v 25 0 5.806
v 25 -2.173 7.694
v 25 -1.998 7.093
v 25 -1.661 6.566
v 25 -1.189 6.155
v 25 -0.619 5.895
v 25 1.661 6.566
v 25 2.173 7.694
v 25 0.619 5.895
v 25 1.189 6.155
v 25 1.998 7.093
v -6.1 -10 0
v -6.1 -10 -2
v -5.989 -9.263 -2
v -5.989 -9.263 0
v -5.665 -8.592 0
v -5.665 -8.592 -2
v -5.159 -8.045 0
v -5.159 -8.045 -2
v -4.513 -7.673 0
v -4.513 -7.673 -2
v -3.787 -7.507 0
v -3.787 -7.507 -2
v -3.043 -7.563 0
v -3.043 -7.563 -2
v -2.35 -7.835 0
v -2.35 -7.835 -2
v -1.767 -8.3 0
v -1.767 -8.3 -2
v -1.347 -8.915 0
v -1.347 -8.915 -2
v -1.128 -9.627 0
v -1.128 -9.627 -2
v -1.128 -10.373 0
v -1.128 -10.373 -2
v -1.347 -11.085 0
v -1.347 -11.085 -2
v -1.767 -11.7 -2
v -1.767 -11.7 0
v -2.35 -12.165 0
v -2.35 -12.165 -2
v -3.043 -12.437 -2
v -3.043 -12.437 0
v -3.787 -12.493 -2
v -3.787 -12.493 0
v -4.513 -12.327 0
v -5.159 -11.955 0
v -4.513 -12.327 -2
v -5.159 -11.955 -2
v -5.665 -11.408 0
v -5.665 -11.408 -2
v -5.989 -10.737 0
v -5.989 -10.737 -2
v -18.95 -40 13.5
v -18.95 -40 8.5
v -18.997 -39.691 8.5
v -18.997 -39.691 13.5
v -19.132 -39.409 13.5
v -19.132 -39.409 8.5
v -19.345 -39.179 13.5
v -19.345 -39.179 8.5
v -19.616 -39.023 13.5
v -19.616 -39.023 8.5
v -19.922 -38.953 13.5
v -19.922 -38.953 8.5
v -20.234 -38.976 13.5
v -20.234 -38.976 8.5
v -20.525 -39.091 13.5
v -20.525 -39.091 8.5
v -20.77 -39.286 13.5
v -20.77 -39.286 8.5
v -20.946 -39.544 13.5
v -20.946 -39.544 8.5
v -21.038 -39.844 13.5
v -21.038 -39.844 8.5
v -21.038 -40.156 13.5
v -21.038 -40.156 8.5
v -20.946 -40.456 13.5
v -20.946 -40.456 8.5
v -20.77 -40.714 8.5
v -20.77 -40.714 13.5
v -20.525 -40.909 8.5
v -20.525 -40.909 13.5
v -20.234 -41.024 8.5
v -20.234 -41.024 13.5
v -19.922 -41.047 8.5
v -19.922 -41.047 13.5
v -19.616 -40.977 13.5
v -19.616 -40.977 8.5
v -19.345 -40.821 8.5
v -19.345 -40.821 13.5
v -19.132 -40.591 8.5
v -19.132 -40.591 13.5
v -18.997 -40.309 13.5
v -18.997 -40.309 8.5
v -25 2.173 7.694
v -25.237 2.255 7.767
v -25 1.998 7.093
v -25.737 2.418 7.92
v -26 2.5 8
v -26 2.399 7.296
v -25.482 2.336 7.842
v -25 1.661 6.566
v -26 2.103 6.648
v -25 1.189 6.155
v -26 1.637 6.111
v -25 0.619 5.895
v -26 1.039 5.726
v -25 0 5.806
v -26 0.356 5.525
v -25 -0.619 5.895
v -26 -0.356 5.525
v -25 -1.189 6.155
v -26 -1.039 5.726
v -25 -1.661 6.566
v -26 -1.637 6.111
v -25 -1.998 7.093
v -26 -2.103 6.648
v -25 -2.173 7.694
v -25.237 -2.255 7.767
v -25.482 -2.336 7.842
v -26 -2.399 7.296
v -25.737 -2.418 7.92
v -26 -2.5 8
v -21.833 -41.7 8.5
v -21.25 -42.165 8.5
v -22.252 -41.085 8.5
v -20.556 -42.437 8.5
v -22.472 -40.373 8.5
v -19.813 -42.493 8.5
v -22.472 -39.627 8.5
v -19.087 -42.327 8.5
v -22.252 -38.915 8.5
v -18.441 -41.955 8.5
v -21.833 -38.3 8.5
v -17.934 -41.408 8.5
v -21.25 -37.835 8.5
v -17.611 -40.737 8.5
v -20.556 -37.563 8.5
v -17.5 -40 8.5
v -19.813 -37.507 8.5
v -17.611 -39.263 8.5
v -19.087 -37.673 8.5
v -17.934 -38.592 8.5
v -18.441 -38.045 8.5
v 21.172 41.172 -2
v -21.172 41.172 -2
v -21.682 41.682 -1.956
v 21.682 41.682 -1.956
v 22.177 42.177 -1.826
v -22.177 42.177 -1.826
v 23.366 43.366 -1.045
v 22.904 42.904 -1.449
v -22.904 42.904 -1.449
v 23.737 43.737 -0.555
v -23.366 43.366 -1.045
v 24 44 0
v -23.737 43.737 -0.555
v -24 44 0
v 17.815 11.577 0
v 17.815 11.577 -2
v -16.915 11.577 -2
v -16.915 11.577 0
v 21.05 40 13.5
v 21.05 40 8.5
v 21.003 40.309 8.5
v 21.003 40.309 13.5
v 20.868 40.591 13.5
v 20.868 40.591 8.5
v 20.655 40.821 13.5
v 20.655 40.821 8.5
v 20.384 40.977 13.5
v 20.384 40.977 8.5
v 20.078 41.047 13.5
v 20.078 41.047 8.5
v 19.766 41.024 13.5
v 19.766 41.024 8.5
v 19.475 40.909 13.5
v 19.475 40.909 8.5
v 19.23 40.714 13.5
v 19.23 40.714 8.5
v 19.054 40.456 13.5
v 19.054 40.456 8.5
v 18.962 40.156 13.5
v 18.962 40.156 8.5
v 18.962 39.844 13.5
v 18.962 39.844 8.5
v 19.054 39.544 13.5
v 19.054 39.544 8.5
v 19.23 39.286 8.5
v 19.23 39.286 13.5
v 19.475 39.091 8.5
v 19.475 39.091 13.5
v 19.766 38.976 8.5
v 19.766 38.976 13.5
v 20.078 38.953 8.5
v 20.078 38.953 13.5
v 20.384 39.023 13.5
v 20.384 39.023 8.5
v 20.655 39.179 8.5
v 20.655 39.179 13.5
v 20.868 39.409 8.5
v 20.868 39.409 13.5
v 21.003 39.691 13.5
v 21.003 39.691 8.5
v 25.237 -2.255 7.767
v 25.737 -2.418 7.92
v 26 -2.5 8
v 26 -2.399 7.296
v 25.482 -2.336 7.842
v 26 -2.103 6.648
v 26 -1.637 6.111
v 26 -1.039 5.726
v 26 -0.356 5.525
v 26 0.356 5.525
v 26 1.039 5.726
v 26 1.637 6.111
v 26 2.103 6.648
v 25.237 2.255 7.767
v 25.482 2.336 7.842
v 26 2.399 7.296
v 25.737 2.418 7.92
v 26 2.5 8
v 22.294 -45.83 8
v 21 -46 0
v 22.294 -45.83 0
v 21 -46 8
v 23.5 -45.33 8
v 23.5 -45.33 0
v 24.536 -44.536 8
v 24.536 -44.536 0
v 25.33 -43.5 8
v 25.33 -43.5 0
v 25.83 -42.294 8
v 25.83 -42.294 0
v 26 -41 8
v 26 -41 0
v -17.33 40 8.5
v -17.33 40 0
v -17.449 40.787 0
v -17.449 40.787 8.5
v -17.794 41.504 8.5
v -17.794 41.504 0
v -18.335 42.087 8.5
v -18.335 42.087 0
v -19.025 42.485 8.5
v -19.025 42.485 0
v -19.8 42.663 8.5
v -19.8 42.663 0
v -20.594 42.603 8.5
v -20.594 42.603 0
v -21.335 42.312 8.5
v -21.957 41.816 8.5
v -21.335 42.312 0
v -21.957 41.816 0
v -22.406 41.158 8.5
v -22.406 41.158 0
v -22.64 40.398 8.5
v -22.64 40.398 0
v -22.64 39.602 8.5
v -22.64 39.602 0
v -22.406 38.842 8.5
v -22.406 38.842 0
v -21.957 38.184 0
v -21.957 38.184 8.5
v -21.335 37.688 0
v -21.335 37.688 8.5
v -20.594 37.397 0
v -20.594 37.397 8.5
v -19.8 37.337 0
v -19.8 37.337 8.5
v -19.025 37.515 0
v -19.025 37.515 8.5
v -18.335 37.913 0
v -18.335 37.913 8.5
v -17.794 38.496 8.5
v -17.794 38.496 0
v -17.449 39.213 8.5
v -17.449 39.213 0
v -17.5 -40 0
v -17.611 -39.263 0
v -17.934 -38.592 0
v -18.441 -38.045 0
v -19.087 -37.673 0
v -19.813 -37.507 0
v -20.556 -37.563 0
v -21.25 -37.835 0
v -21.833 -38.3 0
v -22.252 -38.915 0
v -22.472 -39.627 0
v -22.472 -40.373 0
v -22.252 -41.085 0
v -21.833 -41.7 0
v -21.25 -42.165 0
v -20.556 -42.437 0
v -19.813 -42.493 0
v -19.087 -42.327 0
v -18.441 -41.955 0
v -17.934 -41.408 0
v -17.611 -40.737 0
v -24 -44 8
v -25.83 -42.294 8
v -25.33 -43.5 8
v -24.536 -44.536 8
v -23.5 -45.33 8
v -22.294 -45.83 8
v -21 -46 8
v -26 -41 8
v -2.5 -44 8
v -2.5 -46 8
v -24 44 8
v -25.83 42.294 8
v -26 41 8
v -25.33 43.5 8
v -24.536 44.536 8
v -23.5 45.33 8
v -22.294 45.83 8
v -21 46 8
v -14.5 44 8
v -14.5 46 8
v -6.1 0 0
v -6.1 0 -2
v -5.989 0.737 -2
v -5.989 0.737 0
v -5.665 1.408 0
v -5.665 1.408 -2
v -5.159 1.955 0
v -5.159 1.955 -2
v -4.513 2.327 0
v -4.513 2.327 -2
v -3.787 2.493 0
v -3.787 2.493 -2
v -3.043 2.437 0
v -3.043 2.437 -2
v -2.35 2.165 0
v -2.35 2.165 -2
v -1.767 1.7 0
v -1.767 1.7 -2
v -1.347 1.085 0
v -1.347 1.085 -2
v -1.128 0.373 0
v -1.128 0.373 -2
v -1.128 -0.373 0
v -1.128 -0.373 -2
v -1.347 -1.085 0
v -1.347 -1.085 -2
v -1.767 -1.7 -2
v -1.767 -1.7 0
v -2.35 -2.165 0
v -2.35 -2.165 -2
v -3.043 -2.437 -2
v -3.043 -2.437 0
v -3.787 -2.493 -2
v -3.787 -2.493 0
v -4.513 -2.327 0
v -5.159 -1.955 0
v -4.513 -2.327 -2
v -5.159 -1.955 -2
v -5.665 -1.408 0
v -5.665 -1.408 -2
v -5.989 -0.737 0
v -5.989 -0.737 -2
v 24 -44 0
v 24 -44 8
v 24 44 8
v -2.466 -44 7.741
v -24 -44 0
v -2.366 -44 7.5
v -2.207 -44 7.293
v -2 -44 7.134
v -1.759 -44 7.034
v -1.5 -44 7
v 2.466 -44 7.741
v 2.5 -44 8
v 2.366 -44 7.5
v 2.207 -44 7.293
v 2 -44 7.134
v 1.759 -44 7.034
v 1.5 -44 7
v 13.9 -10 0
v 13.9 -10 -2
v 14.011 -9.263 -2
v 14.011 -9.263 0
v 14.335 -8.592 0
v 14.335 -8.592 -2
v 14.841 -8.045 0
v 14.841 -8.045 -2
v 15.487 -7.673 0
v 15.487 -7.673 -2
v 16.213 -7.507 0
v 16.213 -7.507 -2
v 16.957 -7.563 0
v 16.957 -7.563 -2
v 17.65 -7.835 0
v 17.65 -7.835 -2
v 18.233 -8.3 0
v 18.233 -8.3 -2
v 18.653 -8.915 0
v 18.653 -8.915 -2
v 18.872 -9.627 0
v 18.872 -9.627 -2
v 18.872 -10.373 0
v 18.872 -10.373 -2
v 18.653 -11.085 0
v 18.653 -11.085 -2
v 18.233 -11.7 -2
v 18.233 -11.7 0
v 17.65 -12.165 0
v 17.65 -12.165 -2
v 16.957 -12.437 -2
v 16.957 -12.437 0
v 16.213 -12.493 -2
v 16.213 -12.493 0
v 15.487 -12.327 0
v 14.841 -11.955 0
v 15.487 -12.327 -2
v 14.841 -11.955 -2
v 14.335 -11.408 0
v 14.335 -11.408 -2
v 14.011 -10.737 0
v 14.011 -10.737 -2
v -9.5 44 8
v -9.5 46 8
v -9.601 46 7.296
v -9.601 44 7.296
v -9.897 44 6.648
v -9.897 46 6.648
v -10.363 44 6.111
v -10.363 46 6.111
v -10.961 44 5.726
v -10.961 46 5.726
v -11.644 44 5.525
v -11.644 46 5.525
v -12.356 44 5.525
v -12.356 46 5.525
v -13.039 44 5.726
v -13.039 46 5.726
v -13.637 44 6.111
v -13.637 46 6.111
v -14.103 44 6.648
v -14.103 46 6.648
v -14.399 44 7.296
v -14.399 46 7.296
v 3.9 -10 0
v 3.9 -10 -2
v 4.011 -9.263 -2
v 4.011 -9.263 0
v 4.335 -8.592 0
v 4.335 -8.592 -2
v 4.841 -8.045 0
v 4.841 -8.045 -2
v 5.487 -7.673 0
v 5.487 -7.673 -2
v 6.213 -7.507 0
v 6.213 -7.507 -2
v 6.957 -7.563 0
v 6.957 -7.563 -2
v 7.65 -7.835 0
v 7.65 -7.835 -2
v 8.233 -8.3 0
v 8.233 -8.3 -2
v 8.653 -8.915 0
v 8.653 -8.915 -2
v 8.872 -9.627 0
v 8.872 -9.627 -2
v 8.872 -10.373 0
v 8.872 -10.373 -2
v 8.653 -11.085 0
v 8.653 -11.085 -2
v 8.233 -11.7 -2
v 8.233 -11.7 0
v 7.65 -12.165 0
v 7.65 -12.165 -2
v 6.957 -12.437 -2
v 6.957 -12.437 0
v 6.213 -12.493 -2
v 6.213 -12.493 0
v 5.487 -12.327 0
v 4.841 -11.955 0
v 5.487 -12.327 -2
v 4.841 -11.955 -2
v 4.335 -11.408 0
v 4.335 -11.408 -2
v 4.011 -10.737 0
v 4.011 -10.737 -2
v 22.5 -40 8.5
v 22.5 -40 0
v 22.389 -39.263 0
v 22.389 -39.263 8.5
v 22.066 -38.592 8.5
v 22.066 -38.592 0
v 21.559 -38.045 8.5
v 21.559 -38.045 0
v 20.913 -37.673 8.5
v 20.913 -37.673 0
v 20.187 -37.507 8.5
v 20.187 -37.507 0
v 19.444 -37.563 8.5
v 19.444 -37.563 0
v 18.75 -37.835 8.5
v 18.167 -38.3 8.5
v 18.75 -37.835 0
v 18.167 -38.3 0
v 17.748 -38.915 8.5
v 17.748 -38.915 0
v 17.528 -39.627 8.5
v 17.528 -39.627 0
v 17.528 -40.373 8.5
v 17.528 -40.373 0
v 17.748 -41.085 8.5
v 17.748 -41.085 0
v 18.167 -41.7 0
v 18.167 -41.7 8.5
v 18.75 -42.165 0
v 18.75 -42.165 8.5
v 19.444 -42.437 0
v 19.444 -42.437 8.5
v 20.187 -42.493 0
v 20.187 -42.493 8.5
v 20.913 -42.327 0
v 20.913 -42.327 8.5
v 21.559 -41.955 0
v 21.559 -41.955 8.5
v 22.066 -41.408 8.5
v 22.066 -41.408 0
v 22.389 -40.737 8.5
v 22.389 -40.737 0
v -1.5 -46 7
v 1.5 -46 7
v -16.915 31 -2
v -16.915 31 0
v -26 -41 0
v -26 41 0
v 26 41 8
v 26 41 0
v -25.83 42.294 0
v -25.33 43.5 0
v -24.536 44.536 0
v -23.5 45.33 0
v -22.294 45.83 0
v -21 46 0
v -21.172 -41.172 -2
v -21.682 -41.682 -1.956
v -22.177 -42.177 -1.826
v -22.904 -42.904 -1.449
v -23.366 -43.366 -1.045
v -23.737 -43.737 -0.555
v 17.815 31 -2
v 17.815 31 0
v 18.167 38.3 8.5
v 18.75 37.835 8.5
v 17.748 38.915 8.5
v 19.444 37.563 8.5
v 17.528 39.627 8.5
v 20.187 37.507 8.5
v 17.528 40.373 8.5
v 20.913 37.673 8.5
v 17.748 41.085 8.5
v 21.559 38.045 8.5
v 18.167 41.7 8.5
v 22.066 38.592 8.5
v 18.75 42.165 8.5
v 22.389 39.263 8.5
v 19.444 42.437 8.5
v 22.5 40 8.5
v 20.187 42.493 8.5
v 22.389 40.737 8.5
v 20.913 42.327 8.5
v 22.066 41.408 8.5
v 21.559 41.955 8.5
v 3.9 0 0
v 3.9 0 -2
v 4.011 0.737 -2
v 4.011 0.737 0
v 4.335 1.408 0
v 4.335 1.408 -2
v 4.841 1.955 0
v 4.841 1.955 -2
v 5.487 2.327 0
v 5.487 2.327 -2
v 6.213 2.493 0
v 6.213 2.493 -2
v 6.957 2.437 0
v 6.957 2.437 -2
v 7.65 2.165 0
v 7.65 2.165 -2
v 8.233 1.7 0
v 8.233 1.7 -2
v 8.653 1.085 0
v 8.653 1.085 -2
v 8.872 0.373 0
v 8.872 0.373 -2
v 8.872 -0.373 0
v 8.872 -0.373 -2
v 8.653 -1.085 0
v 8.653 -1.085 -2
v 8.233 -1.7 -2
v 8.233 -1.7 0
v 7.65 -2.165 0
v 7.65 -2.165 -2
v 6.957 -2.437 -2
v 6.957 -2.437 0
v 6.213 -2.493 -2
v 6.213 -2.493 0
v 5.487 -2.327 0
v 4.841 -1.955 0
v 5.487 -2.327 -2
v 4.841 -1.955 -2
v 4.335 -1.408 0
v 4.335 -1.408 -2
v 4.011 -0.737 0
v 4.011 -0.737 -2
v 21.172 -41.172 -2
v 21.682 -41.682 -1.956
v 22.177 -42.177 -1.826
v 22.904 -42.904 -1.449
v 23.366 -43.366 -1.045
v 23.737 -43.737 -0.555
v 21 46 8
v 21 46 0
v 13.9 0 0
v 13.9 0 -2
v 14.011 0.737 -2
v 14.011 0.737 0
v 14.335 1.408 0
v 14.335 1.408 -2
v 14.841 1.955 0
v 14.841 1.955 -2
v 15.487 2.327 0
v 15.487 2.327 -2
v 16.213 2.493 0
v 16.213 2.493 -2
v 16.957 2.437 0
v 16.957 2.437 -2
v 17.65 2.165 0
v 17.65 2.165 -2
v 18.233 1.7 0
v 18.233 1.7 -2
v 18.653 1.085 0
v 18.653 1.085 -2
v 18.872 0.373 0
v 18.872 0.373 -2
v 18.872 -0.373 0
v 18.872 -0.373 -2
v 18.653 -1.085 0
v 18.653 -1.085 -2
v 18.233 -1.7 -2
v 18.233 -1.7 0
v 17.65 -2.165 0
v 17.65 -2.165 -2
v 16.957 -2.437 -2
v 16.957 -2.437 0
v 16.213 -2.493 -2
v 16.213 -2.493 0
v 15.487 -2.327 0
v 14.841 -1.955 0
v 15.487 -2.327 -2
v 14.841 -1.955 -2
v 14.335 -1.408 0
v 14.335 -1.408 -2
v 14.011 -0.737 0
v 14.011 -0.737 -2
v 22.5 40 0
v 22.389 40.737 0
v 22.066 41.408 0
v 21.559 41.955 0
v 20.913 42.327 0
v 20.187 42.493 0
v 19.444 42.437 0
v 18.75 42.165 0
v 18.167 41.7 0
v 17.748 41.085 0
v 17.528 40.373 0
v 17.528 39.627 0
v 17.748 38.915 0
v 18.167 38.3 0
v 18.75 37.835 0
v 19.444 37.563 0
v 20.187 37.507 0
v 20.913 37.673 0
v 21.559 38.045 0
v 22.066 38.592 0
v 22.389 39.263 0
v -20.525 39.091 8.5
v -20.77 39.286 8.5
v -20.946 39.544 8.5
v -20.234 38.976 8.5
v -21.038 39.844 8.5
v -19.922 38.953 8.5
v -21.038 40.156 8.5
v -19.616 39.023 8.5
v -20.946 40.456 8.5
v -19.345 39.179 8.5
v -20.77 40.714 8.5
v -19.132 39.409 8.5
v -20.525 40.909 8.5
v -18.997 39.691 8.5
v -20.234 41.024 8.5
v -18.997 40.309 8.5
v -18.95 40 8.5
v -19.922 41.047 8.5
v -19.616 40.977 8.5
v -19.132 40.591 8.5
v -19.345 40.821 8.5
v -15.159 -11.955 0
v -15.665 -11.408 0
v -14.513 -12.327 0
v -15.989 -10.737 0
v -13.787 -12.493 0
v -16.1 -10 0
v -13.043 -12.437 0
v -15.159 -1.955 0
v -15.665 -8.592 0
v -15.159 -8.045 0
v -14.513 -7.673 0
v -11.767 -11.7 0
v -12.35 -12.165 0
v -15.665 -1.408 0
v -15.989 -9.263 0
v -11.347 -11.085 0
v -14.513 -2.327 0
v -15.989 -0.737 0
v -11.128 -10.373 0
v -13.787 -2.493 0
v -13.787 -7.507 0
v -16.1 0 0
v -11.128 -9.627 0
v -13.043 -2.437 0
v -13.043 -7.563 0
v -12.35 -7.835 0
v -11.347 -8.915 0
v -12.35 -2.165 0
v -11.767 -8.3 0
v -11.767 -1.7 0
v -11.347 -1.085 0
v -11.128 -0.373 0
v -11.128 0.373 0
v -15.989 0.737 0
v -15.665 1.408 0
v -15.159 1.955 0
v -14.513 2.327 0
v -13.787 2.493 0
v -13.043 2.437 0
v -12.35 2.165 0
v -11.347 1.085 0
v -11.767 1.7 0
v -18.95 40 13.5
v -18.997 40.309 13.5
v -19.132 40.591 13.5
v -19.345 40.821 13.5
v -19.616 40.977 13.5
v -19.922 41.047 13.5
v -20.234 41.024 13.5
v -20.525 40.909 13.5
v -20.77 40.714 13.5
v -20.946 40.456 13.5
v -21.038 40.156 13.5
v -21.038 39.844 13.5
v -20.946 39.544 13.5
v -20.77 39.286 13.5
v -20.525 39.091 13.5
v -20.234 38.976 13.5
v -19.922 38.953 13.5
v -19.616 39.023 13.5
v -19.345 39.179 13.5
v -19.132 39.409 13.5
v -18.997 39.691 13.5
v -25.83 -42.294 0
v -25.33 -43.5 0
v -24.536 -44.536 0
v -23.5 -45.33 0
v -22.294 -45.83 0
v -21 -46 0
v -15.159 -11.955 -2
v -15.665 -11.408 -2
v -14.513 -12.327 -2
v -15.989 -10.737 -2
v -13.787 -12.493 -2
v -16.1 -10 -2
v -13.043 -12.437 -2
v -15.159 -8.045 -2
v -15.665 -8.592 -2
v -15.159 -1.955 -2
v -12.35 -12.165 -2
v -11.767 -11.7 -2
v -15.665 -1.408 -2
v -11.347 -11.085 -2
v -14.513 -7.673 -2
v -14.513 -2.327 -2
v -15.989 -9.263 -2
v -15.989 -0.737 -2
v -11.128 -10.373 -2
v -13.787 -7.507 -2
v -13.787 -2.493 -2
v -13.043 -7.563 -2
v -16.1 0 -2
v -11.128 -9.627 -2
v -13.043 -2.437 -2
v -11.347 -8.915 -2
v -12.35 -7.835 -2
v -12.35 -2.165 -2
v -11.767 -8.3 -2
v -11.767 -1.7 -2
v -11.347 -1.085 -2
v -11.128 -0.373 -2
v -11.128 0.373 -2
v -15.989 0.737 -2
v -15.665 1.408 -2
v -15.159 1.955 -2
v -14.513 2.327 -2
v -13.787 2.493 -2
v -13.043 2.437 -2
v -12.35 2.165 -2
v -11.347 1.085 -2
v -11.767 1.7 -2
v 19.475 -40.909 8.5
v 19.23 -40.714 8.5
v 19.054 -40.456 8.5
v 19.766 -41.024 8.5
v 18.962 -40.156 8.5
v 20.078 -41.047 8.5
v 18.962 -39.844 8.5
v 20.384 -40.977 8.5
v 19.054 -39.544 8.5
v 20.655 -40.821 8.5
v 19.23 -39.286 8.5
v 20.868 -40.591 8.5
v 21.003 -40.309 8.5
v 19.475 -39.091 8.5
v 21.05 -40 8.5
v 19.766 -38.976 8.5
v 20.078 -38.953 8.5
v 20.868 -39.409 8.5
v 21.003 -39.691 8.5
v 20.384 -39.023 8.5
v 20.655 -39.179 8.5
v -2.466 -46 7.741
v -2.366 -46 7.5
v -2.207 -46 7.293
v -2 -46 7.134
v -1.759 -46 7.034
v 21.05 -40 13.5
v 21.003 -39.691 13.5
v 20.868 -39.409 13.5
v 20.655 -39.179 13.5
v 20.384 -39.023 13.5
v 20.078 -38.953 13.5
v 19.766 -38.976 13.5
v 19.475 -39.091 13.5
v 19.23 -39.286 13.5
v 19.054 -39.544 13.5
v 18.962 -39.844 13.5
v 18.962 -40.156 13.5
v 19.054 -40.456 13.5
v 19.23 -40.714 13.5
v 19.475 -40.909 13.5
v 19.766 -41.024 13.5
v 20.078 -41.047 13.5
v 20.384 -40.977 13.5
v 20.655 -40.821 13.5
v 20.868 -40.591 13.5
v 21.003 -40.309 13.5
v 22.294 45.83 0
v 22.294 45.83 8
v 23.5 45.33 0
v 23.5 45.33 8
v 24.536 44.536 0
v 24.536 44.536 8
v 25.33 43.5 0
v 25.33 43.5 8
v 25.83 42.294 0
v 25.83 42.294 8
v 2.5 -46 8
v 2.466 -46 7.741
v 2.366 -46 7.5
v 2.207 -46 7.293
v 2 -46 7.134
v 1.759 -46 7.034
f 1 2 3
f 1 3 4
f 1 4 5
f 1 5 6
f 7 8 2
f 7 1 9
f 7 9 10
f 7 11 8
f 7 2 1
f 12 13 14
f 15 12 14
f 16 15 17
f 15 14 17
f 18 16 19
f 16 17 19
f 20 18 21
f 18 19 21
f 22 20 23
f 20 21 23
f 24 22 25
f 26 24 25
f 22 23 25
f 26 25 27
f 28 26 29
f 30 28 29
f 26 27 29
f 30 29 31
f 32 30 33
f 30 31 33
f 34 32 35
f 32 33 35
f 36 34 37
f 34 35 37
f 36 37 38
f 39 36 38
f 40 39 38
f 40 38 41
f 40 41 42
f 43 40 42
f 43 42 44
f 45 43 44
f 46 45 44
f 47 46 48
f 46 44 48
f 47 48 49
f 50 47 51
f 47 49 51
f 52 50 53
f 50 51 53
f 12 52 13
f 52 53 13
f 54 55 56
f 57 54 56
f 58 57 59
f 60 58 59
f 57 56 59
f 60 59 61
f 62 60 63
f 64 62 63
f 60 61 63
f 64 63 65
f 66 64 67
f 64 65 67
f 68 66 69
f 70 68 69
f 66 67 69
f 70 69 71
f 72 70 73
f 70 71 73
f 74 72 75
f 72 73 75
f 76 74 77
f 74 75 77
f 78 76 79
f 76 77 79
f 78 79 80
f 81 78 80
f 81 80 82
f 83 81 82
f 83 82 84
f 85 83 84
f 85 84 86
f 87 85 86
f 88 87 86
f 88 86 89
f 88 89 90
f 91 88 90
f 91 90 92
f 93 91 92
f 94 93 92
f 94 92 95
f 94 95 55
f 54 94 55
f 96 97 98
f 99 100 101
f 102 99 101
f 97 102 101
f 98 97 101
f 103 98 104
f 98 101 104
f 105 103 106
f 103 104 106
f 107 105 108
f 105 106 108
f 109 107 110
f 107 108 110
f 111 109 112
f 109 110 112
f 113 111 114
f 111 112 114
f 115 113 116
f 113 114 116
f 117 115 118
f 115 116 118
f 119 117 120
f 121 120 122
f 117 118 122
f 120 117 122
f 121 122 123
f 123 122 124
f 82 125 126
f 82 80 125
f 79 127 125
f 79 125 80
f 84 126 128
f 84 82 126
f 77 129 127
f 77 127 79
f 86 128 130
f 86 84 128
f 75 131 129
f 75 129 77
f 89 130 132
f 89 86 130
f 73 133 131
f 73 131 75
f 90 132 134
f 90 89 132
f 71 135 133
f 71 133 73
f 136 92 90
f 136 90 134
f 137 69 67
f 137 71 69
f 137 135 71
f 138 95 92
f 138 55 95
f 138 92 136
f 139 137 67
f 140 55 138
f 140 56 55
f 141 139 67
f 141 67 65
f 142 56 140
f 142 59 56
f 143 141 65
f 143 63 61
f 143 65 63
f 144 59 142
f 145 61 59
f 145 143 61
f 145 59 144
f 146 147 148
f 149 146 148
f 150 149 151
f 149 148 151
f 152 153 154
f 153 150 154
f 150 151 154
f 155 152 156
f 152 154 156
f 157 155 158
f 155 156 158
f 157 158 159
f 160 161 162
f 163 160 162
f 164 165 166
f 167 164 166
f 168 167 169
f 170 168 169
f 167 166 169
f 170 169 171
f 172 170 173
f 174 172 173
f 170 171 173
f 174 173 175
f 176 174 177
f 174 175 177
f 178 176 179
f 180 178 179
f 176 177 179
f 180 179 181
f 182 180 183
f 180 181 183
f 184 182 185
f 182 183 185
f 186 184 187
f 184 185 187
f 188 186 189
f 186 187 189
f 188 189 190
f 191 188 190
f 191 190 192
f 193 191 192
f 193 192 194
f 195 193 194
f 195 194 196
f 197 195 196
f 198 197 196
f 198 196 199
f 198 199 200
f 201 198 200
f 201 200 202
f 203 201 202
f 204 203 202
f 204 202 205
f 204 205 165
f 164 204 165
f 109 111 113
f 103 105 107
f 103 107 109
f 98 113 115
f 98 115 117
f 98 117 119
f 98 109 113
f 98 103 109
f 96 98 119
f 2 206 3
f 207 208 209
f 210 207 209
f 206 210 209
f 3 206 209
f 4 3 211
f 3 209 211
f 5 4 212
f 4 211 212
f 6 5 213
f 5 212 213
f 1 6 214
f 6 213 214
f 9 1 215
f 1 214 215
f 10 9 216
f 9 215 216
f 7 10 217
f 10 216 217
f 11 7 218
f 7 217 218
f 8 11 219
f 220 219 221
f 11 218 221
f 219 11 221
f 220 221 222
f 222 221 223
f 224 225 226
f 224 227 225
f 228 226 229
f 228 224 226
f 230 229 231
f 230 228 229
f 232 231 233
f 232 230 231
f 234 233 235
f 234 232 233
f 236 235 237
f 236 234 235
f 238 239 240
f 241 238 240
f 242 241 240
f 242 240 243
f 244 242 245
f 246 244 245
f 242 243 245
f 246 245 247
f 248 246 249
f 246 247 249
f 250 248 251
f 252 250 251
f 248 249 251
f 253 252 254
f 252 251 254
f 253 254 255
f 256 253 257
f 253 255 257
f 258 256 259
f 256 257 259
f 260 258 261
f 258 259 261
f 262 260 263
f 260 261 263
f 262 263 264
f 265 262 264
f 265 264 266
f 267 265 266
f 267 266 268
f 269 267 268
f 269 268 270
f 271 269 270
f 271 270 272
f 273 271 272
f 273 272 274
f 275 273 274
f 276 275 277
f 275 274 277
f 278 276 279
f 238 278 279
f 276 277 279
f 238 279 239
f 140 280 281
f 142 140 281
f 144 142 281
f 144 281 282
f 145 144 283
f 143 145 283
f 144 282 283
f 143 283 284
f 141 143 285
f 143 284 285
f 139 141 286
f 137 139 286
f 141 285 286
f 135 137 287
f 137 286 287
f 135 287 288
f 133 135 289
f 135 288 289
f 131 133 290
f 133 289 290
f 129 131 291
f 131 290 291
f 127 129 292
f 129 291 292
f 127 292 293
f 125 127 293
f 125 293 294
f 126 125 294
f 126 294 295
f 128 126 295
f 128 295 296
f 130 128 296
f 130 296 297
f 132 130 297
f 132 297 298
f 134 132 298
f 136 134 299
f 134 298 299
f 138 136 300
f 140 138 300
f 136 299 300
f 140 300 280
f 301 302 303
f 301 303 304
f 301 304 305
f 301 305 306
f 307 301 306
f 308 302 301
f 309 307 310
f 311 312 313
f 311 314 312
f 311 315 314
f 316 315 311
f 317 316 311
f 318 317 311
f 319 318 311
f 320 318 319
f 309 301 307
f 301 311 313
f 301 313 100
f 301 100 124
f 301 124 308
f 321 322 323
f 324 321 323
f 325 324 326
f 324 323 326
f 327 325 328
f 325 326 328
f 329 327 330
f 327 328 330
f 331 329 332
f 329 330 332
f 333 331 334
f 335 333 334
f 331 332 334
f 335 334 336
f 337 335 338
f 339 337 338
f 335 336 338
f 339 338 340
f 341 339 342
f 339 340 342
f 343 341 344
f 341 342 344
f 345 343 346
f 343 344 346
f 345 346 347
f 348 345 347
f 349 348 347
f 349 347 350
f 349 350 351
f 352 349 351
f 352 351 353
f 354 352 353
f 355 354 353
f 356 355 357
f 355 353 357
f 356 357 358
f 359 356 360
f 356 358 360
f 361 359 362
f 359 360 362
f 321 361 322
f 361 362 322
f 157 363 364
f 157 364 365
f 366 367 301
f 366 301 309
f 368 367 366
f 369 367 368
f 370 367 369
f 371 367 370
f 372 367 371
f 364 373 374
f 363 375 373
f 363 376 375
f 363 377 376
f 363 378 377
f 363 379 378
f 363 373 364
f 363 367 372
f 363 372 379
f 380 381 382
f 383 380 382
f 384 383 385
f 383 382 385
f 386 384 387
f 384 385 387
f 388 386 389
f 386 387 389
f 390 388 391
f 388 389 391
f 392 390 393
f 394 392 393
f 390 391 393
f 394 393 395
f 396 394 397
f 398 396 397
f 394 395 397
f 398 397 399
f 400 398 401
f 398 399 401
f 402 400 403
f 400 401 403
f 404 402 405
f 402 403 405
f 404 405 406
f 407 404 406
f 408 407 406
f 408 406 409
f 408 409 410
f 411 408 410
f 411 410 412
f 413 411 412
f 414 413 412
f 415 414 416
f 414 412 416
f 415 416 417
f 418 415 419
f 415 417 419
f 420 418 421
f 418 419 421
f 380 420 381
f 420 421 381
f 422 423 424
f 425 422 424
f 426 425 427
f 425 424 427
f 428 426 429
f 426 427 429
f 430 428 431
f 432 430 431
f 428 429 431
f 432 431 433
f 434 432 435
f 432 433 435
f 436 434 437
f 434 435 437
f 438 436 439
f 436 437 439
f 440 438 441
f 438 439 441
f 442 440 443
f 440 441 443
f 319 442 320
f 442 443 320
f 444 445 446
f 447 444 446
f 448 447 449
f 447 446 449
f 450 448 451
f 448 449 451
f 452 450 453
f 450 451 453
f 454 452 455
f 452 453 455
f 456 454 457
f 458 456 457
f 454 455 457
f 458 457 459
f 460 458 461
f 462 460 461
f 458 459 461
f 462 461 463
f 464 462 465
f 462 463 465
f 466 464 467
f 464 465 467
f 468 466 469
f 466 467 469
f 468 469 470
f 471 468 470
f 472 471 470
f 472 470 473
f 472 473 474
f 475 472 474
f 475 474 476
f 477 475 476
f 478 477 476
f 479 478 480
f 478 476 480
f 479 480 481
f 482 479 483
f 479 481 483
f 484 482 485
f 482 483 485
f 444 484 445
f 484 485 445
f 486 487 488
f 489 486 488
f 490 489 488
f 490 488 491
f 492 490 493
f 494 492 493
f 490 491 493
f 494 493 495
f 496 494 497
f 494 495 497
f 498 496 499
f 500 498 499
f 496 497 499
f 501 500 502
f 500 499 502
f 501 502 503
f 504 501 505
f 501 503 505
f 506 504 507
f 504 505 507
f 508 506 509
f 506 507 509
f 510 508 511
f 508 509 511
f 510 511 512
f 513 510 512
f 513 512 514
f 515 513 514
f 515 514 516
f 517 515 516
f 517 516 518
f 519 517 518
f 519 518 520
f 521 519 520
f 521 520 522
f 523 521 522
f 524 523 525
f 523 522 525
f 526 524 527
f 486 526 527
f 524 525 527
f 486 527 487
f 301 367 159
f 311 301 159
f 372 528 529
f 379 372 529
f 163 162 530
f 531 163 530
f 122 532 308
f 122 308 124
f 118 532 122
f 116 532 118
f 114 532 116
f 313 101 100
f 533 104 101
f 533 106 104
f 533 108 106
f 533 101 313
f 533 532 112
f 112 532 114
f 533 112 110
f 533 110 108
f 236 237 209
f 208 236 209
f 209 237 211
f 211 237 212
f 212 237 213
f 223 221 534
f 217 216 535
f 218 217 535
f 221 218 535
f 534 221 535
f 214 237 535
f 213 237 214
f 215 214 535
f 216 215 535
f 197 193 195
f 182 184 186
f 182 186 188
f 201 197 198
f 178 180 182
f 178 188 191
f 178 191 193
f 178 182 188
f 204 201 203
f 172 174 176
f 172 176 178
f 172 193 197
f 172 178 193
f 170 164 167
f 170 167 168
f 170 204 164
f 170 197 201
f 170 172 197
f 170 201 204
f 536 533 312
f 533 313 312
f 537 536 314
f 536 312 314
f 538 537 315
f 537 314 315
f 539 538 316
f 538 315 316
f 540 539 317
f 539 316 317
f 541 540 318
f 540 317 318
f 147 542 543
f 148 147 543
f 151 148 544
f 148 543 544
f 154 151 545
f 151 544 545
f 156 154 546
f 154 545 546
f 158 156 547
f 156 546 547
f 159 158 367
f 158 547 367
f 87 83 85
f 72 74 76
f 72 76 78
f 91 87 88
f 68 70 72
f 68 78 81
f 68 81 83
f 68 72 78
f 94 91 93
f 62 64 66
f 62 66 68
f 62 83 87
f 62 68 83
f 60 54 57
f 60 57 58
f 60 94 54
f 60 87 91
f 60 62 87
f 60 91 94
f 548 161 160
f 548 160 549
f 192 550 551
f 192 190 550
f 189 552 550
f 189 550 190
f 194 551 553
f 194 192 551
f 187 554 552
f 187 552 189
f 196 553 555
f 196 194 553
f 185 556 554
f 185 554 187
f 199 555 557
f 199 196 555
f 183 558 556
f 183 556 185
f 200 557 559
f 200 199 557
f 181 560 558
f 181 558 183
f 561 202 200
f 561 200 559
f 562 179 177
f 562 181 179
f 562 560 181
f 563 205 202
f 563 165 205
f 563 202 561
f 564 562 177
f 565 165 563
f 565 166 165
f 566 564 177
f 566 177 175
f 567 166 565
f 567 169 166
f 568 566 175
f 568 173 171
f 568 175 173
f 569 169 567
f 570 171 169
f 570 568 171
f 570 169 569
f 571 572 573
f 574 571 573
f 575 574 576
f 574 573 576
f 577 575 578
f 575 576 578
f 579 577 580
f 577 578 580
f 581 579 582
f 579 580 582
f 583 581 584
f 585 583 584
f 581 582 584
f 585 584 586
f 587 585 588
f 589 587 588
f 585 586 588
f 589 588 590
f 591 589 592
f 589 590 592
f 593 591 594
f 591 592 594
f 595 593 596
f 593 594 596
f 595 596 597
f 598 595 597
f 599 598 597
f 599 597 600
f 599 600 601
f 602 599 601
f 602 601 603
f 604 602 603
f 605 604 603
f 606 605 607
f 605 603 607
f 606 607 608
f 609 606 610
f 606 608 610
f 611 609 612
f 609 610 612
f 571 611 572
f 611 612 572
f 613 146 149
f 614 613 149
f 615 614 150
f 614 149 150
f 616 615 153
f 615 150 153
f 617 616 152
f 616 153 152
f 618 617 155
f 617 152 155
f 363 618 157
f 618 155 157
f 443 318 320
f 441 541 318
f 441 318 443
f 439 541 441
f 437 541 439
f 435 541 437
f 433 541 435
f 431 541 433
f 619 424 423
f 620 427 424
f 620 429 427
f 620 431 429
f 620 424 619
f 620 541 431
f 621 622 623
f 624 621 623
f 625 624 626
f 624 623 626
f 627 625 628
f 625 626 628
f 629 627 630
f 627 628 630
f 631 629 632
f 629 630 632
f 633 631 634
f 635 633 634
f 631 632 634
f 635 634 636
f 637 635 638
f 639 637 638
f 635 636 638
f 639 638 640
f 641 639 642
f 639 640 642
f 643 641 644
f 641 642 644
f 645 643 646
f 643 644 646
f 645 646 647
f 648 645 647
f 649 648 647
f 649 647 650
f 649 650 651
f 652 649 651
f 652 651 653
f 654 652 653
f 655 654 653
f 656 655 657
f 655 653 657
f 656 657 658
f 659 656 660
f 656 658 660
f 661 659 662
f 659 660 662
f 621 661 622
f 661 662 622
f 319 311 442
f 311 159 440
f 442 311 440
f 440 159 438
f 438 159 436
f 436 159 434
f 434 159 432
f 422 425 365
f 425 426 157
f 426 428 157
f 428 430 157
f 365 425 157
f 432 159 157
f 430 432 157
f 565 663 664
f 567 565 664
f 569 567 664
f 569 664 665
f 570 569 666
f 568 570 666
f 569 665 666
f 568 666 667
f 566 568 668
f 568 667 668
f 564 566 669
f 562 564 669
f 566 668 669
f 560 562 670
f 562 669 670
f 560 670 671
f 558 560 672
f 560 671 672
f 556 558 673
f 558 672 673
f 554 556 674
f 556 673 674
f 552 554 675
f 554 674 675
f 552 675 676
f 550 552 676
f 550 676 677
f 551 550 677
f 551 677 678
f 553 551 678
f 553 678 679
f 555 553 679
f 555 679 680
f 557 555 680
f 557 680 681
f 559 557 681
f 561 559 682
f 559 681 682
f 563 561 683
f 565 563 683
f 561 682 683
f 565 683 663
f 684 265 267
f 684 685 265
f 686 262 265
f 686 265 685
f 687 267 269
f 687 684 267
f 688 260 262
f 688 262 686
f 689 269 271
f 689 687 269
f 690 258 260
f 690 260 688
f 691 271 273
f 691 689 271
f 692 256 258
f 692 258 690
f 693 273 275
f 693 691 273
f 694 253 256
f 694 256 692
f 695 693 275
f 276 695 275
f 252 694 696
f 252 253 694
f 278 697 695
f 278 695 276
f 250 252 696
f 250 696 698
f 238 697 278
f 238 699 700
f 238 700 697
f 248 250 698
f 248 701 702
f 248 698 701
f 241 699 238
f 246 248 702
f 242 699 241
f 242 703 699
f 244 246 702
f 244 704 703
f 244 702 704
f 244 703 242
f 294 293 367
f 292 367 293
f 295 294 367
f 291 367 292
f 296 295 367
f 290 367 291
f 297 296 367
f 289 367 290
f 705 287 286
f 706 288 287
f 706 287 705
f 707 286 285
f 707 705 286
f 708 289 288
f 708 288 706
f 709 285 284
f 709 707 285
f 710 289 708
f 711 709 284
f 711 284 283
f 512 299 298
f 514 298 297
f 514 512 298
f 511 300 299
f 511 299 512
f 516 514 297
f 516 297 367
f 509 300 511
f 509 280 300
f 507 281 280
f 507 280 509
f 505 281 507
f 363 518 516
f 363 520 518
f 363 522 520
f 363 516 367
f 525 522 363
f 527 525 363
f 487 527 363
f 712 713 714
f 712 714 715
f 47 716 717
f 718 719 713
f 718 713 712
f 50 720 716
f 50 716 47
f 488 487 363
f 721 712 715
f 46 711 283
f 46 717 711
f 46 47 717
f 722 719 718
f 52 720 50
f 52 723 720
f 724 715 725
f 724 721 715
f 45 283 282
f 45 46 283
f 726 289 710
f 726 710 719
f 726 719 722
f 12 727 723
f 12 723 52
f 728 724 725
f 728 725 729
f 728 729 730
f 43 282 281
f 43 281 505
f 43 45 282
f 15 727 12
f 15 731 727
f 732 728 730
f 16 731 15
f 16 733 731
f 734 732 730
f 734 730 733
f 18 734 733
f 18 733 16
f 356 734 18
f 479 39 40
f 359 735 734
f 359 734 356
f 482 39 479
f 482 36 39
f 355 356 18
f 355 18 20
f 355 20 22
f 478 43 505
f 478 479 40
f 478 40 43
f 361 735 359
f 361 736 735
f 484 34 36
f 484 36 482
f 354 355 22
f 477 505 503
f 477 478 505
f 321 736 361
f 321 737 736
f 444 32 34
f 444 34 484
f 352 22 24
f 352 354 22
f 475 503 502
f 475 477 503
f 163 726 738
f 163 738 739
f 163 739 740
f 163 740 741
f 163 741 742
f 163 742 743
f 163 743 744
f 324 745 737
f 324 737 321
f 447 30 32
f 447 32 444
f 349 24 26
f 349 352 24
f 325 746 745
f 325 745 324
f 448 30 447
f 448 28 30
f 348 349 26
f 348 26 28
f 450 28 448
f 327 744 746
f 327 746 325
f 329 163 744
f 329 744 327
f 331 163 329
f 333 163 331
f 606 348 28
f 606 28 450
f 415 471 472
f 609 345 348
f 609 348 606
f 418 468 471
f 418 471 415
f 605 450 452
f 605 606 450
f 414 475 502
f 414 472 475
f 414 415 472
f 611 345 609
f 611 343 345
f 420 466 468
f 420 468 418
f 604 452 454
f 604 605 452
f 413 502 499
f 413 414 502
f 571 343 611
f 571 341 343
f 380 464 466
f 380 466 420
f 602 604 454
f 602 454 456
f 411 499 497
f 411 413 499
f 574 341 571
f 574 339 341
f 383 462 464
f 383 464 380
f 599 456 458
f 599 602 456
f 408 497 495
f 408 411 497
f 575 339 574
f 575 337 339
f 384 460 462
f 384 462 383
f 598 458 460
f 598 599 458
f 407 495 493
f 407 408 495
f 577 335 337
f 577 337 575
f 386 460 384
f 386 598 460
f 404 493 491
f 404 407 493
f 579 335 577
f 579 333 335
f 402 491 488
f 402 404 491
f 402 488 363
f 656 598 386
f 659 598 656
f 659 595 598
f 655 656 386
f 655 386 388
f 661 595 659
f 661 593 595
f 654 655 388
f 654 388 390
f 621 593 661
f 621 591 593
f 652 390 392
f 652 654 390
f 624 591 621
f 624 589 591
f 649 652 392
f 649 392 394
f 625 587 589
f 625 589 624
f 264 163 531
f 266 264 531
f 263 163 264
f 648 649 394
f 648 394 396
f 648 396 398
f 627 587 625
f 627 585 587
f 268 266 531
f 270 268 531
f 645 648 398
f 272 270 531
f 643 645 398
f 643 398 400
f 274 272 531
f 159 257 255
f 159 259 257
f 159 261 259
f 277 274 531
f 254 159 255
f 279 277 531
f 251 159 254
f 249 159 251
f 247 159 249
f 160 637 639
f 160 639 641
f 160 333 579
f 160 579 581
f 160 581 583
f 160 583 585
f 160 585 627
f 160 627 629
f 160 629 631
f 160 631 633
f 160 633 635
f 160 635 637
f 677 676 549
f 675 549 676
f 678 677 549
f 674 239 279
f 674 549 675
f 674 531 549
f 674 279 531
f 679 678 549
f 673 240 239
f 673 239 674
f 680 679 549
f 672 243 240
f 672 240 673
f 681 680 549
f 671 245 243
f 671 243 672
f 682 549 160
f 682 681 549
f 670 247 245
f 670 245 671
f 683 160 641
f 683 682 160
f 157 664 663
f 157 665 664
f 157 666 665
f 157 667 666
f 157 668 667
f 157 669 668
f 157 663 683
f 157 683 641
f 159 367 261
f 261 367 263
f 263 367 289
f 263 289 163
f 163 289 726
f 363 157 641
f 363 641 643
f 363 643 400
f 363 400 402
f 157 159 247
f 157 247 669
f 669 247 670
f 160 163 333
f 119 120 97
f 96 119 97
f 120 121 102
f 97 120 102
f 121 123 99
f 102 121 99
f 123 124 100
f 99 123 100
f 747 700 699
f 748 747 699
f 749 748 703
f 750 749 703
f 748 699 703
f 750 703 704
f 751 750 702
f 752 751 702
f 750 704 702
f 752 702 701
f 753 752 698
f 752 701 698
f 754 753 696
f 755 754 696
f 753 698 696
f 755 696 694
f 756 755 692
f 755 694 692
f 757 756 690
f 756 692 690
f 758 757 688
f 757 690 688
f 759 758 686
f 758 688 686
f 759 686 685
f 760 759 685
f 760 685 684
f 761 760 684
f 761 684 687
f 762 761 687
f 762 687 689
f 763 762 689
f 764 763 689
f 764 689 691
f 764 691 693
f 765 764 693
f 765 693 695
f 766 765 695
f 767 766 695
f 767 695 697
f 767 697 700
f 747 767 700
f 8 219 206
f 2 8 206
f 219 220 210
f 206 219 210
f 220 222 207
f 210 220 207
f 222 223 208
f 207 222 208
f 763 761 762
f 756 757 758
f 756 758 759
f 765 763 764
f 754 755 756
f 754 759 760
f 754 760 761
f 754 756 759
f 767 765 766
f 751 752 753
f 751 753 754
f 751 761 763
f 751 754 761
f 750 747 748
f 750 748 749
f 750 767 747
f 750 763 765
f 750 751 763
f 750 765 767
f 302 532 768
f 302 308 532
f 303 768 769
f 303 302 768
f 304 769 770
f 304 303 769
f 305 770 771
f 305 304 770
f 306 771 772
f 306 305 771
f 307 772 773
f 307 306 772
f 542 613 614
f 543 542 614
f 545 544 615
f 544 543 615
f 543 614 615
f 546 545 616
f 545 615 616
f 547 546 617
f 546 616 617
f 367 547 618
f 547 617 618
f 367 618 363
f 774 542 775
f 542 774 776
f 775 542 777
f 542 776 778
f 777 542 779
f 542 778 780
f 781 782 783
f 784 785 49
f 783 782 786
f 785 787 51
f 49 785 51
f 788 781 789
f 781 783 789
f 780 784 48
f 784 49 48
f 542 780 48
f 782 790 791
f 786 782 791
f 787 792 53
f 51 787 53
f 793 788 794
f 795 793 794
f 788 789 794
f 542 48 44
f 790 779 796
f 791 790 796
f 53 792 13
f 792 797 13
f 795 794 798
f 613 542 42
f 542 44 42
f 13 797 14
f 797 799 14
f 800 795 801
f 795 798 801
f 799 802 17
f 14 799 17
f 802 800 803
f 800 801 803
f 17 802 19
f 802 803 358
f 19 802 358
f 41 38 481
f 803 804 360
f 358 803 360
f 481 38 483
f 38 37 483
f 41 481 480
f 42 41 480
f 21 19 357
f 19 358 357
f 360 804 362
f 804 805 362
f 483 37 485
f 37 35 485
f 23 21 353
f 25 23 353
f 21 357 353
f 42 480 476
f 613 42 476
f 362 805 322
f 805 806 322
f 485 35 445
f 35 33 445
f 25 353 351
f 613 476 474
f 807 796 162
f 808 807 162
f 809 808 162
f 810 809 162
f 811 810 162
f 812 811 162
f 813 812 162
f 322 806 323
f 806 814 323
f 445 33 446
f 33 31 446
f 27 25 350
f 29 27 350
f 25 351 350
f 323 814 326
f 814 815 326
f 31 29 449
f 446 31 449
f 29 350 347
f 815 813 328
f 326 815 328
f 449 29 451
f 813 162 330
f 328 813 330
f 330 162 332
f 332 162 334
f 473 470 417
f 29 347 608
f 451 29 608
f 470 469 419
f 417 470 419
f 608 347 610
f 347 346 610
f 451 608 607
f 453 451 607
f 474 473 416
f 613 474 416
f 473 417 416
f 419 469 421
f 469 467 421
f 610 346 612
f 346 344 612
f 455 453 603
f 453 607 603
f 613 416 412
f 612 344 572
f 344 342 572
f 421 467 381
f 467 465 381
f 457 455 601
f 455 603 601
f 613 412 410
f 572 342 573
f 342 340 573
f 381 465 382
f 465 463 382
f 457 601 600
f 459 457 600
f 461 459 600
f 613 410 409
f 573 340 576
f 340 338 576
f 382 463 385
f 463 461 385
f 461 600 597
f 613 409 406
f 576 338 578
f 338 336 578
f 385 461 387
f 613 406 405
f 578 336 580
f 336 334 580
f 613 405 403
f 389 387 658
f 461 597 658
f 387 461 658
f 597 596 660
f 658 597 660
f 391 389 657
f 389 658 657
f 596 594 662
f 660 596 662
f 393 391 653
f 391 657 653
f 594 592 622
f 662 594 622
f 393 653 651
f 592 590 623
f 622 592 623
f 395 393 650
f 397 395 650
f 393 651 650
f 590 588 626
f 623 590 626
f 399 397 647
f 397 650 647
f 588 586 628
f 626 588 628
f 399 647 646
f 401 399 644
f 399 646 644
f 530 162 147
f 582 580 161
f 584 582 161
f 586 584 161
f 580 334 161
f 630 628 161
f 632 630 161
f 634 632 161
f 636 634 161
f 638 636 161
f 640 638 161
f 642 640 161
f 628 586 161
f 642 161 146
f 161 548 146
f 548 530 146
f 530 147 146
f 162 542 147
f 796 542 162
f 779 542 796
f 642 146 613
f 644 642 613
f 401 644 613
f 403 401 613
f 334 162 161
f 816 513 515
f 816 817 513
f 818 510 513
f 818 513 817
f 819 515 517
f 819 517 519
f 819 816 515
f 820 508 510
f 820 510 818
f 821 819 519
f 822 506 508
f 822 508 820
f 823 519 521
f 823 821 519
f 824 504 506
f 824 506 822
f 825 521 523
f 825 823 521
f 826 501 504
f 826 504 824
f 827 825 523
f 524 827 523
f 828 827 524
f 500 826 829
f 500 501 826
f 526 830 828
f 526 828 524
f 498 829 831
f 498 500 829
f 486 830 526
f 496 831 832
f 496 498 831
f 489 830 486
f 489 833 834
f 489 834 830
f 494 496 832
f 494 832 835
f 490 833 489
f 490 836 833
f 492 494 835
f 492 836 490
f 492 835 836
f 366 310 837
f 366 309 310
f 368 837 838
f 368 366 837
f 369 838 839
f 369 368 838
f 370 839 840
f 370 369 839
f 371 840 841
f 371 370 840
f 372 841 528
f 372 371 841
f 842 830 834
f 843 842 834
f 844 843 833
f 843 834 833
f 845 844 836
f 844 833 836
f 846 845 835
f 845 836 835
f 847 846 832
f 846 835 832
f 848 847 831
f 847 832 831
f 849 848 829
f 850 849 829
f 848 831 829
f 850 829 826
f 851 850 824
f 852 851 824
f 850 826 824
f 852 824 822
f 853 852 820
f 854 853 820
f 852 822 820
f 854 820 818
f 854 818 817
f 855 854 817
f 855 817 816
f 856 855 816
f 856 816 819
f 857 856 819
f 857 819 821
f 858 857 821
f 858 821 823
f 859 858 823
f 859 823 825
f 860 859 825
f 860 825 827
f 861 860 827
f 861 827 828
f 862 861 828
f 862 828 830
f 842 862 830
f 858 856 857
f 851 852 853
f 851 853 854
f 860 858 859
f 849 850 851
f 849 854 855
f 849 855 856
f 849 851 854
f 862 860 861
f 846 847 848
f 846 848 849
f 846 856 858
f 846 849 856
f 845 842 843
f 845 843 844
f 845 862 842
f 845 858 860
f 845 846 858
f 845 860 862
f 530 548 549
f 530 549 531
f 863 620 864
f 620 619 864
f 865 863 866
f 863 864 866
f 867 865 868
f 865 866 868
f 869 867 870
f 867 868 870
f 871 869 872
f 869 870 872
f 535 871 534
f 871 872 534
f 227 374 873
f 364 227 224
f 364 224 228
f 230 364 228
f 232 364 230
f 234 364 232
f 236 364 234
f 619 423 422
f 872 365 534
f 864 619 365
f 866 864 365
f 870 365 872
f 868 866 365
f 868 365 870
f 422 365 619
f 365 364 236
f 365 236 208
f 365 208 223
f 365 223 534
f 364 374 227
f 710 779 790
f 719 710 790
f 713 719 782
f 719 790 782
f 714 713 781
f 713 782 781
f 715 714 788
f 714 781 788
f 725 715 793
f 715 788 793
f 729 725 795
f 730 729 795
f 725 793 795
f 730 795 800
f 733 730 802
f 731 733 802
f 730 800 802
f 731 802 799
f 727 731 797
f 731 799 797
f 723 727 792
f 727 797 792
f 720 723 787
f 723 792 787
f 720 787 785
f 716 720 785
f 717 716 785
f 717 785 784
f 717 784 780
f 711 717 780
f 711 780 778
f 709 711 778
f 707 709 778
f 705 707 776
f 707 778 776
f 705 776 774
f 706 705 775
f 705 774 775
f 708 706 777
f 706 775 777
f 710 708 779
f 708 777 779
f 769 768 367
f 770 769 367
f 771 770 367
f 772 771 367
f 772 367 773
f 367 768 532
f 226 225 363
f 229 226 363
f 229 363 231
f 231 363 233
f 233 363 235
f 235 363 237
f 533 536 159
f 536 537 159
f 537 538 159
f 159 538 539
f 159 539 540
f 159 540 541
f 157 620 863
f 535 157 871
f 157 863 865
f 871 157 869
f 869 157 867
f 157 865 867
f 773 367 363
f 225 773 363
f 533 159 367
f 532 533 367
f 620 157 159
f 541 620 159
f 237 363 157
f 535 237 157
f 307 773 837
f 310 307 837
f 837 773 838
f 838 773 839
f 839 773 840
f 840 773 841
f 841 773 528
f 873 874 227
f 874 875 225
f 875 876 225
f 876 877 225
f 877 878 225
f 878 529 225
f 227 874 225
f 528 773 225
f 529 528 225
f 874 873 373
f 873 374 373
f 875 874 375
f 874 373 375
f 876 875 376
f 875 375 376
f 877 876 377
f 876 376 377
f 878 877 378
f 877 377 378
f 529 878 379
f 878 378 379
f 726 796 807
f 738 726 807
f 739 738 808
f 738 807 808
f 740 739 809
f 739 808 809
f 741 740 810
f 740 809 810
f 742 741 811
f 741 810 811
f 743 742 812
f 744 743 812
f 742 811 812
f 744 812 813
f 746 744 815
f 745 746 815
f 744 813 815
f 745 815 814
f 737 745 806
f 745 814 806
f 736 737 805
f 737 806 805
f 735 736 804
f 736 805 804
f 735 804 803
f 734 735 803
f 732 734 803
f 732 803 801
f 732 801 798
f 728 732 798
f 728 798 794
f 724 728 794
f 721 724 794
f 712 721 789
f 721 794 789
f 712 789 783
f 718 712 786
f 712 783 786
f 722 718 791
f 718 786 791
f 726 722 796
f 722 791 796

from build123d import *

# Parameters (mm, degrees)
SKETCH1_W           = 52
SKETCH1_H           = 92
SKETCH1_W_2         = 48
SKETCH1_H_2         = 88
EXTRUDE_THIN1_DEPTH = 8
SKETCH2_W           = 48
SKETCH2_H           = 88
BOSS_EXTRUDE1_DEPTH = 2
SKETCH4_W           = 34.729851986
SKETCH4_H           = 19.422991295
CUT_EXTRUDE1_DEPTH  = 2
SKETCH5_R           = 2.5
CUT_EXTRUDE2_DEPTH  = 2
FILLET2_R           = 5
SKETCH6_R           = 1.05
BOSS_EXTRUDE2_DEPTH = 13.5
SKETCH7_R           = 2.67
SKETCH7_R_2         = 1.05
SKETCH7_R_3         = 2.5
SKETCH7_R_4         = 0.991419058
BOSS_EXTRUDE3_DEPTH = 8.5
FILLET3_R           = 3
SKETCH8_R           = 2.5
CUT_EXTRUDE3_DEPTH  = 10
SKETCH9_W           = 5
SKETCH9_H           = 2
CUT_EXTRUDE4_DEPTH  = 10
FILLET4_R           = 1
CUT_EXTRUDE5_DEPTH  = 1
CUT_EXTRUDE5_DRAFT  = -17
CUT_EXTRUDE6_DEPTH  = 1
CUT_EXTRUDE6_DRAFT  = -17


# Some blends are built 0.0001 mm under size
with BuildPart() as part:
    # Sketch1 → Extrude-Thin1 (new body)
    with BuildSketch(Plane.XY):
        Rectangle(SKETCH1_W, SKETCH1_H)
        Rectangle(SKETCH1_W_2, SKETCH1_H_2, mode=Mode.SUBTRACT)
    extrude(amount=EXTRUDE_THIN1_DEPTH)

    # Fillet2
    fillet2_edges = [part.edges().sort_by_distance(p)[0] for p in [
        (26, -46, 4),
        (-26, -46, 4),
        (-26, 46, 4),
        (26, 46, 4),
    ]]
    fillet(fillet2_edges, radius=FILLET2_R)

    # Sketch8 → Cut-Extrude3 (cut)
    with BuildSketch(Plane(origin=(0, 46, 0), x_dir=(1, 0, 0), z_dir=(0, 1, 0))):
        with Locations((-12, -8)):
            Circle(SKETCH8_R)
    extrude(amount=-CUT_EXTRUDE3_DEPTH, mode=Mode.SUBTRACT)

    # Sketch9 → Cut-Extrude4 (cut)
    with BuildSketch(Plane.XZ.offset(46)):
        with Locations((0, 8)):
            Rectangle(SKETCH9_W, SKETCH9_H)
    extrude(amount=-CUT_EXTRUDE4_DEPTH, mode=Mode.SUBTRACT)

    # Fillet4
    fillet4_edges = [part.edges().sort_by_distance(p)[0] for p in [
        (-2.5, -45, 7),
        (2.5, -45, 7),
    ]]
    fillet(fillet4_edges, radius=FILLET4_R - 0.0001)  # a hair under: the kernel refuses the full size


with BuildPart() as body_2:
    # Sketch2 → Boss-Extrude1 (new body)
    with BuildSketch(Plane.XY):
        Rectangle(SKETCH2_W, SKETCH2_H)
    extrude(amount=-BOSS_EXTRUDE1_DEPTH)

    # Sketch4 → Cut-Extrude1 (cut)
    with BuildSketch(Plane(origin=(0, 0, -2), x_dir=(-1, 0, 0), z_dir=(0, 0, -1))):
        with Locations((-0.450201785, 21.288504353)):
            Rectangle(SKETCH4_W, SKETCH4_H)
    extrude(amount=-CUT_EXTRUDE1_DEPTH, mode=Mode.SUBTRACT)

    # Sketch5 → Cut-Extrude2 (cut)
    with BuildSketch(Plane(origin=(0, 0, -2), x_dir=(-1, 0, 0), z_dir=(0, 0, -1))):
        with Locations((-16.400207882, 0)):
            Circle(SKETCH5_R)
        with Locations((-6.400207882, 0)):
            Circle(SKETCH5_R)
        with Locations((3.599792118, 0)):
            Circle(SKETCH5_R)
        with Locations((13.599792118, 0)):
            Circle(SKETCH5_R)
        with Locations((-6.400207882, -10)):
            Circle(SKETCH5_R)
        with Locations((3.599792118, -10)):
            Circle(SKETCH5_R)
        with Locations((13.599792118, -10)):
            Circle(SKETCH5_R)
        with Locations((-16.400207882, -10)):
            Circle(SKETCH5_R)
    extrude(amount=-CUT_EXTRUDE2_DEPTH, mode=Mode.SUBTRACT)

    # Sketch6 → Boss-Extrude2 (add)
    with BuildSketch(Plane.XY):
        with Locations((-20, 40)):
            Circle(SKETCH6_R)
        with Locations((-20, -40)):
            Circle(SKETCH6_R)
        with Locations((20, 40)):
            Circle(SKETCH6_R)
        with Locations((20, -40)):
            Circle(SKETCH6_R)
    extrude(amount=BOSS_EXTRUDE2_DEPTH)

    # Sketch7 → Boss-Extrude3 (add)
    # profile 1 of 4: a face of its own
    with BuildSketch(Plane.XY):
        with Locations((-20, 40)):
            Circle(SKETCH7_R)
        with Locations((-20, 40)):
            Circle(SKETCH7_R_2, mode=Mode.SUBTRACT)
    # profile 2 of 4: a face of its own
    with BuildSketch(Plane.XY):
        with Locations((20, 40)):
            Circle(SKETCH7_R_3)
        with Locations((20, 40)):
            Circle(SKETCH7_R_2, mode=Mode.SUBTRACT)
    # profile 3 of 4: a face of its own
    with BuildSketch(Plane.XY):
        with Locations((-20, -40)):
            Circle(SKETCH7_R_3)
        with Locations((-20, -40)):
            Circle(SKETCH7_R_2, mode=Mode.SUBTRACT)
    # profile 4 of 4: a face of its own
    with BuildSketch(Plane.XY):
        with Locations((20, -40)):
            Circle(SKETCH7_R_3)
        with Locations((20, -40)):
            Circle(SKETCH7_R_4, mode=Mode.SUBTRACT)
    extrude(amount=BOSS_EXTRUDE3_DEPTH)

    # Fillet3
    # the kernel refuses this fillet: 3 mm, written as the material it takes off along each edge
    with BuildSketch(Plane(origin=(31.071067812, -44, -2), x_dir=(0, 1, 0), z_dir=(-1, 0, 0))) as fillet3_piece_1:
        with BuildLine():
            CenterArc((2.828427125, -3), FILLET3_R, 90, 70.528779366)
            Line((0, -2), (-0.056568542, -1.98))
            ThreePointArc((-0.056568542, -1.98), (-0.06, -1), (-0.06, 0))
            Line((-0.06, 0), (0, 0.06))
            Line((0, 0.06), (2.828427125, 0.06))
            Line((2.828427125, 0.06), (2.828427125, 0))
        make_face()
    extrude(amount=62.142135624, mode=Mode.SUBTRACT)
    with BuildSketch(Plane(origin=(24, 51.071067812, -2), x_dir=(0, 0, 1), z_dir=(0, -1, 0)), Plane(origin=(-24, -51.071067812, -2), x_dir=(0, 0, 1), z_dir=(0, 1, 0))) as fillet3_piece_2:
        with BuildLine():
            CenterArc((3, 2.828427125), FILLET3_R, 180, 70.528779366)
            Line((0, 2.828427125), (-0.06, 2.828427125))
            Line((-0.06, 2.828427125), (-0.06, 0))
            Line((-0.06, 0), (0, -0.06))
            ThreePointArc((0, -0.06), (1, -0.06), (1.98, -0.056568542))
            Line((1.98, -0.056568542), (2, 0))
        make_face()
    extrude(amount=102.142135624, mode=Mode.SUBTRACT)
    with BuildSketch(Plane(origin=(-31.071067812, 44, -2), x_dir=(0, 0, 1), z_dir=(1, 0, 0))) as fillet3_piece_3:
        with BuildLine():
            CenterArc((3, 2.828427125), FILLET3_R, 180, 70.528779366)
            Line((0, 2.828427125), (-0.06, 2.828427125))
            Line((-0.06, 2.828427125), (-0.06, 0))
            Line((-0.06, 0), (0, -0.06))
            ThreePointArc((0, -0.06), (1, -0.06), (1.98, -0.056568542))
            Line((1.98, -0.056568542), (2, 0))
        make_face()
    extrude(amount=62.142135624, mode=Mode.SUBTRACT)


with BuildPart() as cut_extrude5_tool:
    # Sketch10 → Cut-Extrude5 (with draft: the straight prism first)
    with BuildSketch(Plane.ZY.offset(26)):
        with BuildLine():
            ThreePointArc((8, 2.5), (5.5, 0), (8, -2.5))
            Line((8, -2.5), (8, 2.5))
        make_face()
    extrude(amount=-CUT_EXTRUDE5_DEPTH)
    # Cut-Extrude5: the draft: its side faces are tilted about the plane it starts from
    cut_extrude5_sides = [cut_extrude5_tool.faces().sort_by_distance(p)[0] for p in [
        (-25.5, 0, 5.5),
        (-25.5, 0, 8),
    ]]
    draft(cut_extrude5_sides, Plane.ZY.offset(26), CUT_EXTRUDE5_DRAFT)


with BuildPart() as part_1:
    add(part.part)

    # Cut-Extrude5: cut by cut_extrude5_tool
    add(cut_extrude5_tool.part, mode=Mode.SUBTRACT)


with BuildPart() as cut_extrude6_tool:
    # Sketch11 → Cut-Extrude6 (with draft: the straight prism first)
    with BuildSketch(Plane(origin=(26, 0, 0), x_dir=(0, 0, -1), z_dir=(1, 0, 0))):
        with BuildLine():
            Line((-8, 2.5), (-8, -2.5))
            ThreePointArc((-8, -2.5), (-5.5, 0), (-8, 2.5))
        make_face()
    extrude(amount=-CUT_EXTRUDE6_DEPTH)
    # Cut-Extrude6: the draft: its side faces are tilted about the plane it starts from
    cut_extrude6_sides = [cut_extrude6_tool.faces().sort_by_distance(p)[0] for p in [
        (25.5, 0, 8),
        (25.5, 0, 5.5),
    ]]
    draft(cut_extrude6_sides, Plane(origin=(26, 0, 0), x_dir=(0, 0, -1), z_dir=(1, 0, 0)), CUT_EXTRUDE6_DRAFT)


with BuildPart() as part_2:
    add(part_1.part)

    # Cut-Extrude6: cut by cut_extrude6_tool
    add(cut_extrude6_tool.part, mode=Mode.SUBTRACT)


solid = Compound([body_2.part, part_2.part])
